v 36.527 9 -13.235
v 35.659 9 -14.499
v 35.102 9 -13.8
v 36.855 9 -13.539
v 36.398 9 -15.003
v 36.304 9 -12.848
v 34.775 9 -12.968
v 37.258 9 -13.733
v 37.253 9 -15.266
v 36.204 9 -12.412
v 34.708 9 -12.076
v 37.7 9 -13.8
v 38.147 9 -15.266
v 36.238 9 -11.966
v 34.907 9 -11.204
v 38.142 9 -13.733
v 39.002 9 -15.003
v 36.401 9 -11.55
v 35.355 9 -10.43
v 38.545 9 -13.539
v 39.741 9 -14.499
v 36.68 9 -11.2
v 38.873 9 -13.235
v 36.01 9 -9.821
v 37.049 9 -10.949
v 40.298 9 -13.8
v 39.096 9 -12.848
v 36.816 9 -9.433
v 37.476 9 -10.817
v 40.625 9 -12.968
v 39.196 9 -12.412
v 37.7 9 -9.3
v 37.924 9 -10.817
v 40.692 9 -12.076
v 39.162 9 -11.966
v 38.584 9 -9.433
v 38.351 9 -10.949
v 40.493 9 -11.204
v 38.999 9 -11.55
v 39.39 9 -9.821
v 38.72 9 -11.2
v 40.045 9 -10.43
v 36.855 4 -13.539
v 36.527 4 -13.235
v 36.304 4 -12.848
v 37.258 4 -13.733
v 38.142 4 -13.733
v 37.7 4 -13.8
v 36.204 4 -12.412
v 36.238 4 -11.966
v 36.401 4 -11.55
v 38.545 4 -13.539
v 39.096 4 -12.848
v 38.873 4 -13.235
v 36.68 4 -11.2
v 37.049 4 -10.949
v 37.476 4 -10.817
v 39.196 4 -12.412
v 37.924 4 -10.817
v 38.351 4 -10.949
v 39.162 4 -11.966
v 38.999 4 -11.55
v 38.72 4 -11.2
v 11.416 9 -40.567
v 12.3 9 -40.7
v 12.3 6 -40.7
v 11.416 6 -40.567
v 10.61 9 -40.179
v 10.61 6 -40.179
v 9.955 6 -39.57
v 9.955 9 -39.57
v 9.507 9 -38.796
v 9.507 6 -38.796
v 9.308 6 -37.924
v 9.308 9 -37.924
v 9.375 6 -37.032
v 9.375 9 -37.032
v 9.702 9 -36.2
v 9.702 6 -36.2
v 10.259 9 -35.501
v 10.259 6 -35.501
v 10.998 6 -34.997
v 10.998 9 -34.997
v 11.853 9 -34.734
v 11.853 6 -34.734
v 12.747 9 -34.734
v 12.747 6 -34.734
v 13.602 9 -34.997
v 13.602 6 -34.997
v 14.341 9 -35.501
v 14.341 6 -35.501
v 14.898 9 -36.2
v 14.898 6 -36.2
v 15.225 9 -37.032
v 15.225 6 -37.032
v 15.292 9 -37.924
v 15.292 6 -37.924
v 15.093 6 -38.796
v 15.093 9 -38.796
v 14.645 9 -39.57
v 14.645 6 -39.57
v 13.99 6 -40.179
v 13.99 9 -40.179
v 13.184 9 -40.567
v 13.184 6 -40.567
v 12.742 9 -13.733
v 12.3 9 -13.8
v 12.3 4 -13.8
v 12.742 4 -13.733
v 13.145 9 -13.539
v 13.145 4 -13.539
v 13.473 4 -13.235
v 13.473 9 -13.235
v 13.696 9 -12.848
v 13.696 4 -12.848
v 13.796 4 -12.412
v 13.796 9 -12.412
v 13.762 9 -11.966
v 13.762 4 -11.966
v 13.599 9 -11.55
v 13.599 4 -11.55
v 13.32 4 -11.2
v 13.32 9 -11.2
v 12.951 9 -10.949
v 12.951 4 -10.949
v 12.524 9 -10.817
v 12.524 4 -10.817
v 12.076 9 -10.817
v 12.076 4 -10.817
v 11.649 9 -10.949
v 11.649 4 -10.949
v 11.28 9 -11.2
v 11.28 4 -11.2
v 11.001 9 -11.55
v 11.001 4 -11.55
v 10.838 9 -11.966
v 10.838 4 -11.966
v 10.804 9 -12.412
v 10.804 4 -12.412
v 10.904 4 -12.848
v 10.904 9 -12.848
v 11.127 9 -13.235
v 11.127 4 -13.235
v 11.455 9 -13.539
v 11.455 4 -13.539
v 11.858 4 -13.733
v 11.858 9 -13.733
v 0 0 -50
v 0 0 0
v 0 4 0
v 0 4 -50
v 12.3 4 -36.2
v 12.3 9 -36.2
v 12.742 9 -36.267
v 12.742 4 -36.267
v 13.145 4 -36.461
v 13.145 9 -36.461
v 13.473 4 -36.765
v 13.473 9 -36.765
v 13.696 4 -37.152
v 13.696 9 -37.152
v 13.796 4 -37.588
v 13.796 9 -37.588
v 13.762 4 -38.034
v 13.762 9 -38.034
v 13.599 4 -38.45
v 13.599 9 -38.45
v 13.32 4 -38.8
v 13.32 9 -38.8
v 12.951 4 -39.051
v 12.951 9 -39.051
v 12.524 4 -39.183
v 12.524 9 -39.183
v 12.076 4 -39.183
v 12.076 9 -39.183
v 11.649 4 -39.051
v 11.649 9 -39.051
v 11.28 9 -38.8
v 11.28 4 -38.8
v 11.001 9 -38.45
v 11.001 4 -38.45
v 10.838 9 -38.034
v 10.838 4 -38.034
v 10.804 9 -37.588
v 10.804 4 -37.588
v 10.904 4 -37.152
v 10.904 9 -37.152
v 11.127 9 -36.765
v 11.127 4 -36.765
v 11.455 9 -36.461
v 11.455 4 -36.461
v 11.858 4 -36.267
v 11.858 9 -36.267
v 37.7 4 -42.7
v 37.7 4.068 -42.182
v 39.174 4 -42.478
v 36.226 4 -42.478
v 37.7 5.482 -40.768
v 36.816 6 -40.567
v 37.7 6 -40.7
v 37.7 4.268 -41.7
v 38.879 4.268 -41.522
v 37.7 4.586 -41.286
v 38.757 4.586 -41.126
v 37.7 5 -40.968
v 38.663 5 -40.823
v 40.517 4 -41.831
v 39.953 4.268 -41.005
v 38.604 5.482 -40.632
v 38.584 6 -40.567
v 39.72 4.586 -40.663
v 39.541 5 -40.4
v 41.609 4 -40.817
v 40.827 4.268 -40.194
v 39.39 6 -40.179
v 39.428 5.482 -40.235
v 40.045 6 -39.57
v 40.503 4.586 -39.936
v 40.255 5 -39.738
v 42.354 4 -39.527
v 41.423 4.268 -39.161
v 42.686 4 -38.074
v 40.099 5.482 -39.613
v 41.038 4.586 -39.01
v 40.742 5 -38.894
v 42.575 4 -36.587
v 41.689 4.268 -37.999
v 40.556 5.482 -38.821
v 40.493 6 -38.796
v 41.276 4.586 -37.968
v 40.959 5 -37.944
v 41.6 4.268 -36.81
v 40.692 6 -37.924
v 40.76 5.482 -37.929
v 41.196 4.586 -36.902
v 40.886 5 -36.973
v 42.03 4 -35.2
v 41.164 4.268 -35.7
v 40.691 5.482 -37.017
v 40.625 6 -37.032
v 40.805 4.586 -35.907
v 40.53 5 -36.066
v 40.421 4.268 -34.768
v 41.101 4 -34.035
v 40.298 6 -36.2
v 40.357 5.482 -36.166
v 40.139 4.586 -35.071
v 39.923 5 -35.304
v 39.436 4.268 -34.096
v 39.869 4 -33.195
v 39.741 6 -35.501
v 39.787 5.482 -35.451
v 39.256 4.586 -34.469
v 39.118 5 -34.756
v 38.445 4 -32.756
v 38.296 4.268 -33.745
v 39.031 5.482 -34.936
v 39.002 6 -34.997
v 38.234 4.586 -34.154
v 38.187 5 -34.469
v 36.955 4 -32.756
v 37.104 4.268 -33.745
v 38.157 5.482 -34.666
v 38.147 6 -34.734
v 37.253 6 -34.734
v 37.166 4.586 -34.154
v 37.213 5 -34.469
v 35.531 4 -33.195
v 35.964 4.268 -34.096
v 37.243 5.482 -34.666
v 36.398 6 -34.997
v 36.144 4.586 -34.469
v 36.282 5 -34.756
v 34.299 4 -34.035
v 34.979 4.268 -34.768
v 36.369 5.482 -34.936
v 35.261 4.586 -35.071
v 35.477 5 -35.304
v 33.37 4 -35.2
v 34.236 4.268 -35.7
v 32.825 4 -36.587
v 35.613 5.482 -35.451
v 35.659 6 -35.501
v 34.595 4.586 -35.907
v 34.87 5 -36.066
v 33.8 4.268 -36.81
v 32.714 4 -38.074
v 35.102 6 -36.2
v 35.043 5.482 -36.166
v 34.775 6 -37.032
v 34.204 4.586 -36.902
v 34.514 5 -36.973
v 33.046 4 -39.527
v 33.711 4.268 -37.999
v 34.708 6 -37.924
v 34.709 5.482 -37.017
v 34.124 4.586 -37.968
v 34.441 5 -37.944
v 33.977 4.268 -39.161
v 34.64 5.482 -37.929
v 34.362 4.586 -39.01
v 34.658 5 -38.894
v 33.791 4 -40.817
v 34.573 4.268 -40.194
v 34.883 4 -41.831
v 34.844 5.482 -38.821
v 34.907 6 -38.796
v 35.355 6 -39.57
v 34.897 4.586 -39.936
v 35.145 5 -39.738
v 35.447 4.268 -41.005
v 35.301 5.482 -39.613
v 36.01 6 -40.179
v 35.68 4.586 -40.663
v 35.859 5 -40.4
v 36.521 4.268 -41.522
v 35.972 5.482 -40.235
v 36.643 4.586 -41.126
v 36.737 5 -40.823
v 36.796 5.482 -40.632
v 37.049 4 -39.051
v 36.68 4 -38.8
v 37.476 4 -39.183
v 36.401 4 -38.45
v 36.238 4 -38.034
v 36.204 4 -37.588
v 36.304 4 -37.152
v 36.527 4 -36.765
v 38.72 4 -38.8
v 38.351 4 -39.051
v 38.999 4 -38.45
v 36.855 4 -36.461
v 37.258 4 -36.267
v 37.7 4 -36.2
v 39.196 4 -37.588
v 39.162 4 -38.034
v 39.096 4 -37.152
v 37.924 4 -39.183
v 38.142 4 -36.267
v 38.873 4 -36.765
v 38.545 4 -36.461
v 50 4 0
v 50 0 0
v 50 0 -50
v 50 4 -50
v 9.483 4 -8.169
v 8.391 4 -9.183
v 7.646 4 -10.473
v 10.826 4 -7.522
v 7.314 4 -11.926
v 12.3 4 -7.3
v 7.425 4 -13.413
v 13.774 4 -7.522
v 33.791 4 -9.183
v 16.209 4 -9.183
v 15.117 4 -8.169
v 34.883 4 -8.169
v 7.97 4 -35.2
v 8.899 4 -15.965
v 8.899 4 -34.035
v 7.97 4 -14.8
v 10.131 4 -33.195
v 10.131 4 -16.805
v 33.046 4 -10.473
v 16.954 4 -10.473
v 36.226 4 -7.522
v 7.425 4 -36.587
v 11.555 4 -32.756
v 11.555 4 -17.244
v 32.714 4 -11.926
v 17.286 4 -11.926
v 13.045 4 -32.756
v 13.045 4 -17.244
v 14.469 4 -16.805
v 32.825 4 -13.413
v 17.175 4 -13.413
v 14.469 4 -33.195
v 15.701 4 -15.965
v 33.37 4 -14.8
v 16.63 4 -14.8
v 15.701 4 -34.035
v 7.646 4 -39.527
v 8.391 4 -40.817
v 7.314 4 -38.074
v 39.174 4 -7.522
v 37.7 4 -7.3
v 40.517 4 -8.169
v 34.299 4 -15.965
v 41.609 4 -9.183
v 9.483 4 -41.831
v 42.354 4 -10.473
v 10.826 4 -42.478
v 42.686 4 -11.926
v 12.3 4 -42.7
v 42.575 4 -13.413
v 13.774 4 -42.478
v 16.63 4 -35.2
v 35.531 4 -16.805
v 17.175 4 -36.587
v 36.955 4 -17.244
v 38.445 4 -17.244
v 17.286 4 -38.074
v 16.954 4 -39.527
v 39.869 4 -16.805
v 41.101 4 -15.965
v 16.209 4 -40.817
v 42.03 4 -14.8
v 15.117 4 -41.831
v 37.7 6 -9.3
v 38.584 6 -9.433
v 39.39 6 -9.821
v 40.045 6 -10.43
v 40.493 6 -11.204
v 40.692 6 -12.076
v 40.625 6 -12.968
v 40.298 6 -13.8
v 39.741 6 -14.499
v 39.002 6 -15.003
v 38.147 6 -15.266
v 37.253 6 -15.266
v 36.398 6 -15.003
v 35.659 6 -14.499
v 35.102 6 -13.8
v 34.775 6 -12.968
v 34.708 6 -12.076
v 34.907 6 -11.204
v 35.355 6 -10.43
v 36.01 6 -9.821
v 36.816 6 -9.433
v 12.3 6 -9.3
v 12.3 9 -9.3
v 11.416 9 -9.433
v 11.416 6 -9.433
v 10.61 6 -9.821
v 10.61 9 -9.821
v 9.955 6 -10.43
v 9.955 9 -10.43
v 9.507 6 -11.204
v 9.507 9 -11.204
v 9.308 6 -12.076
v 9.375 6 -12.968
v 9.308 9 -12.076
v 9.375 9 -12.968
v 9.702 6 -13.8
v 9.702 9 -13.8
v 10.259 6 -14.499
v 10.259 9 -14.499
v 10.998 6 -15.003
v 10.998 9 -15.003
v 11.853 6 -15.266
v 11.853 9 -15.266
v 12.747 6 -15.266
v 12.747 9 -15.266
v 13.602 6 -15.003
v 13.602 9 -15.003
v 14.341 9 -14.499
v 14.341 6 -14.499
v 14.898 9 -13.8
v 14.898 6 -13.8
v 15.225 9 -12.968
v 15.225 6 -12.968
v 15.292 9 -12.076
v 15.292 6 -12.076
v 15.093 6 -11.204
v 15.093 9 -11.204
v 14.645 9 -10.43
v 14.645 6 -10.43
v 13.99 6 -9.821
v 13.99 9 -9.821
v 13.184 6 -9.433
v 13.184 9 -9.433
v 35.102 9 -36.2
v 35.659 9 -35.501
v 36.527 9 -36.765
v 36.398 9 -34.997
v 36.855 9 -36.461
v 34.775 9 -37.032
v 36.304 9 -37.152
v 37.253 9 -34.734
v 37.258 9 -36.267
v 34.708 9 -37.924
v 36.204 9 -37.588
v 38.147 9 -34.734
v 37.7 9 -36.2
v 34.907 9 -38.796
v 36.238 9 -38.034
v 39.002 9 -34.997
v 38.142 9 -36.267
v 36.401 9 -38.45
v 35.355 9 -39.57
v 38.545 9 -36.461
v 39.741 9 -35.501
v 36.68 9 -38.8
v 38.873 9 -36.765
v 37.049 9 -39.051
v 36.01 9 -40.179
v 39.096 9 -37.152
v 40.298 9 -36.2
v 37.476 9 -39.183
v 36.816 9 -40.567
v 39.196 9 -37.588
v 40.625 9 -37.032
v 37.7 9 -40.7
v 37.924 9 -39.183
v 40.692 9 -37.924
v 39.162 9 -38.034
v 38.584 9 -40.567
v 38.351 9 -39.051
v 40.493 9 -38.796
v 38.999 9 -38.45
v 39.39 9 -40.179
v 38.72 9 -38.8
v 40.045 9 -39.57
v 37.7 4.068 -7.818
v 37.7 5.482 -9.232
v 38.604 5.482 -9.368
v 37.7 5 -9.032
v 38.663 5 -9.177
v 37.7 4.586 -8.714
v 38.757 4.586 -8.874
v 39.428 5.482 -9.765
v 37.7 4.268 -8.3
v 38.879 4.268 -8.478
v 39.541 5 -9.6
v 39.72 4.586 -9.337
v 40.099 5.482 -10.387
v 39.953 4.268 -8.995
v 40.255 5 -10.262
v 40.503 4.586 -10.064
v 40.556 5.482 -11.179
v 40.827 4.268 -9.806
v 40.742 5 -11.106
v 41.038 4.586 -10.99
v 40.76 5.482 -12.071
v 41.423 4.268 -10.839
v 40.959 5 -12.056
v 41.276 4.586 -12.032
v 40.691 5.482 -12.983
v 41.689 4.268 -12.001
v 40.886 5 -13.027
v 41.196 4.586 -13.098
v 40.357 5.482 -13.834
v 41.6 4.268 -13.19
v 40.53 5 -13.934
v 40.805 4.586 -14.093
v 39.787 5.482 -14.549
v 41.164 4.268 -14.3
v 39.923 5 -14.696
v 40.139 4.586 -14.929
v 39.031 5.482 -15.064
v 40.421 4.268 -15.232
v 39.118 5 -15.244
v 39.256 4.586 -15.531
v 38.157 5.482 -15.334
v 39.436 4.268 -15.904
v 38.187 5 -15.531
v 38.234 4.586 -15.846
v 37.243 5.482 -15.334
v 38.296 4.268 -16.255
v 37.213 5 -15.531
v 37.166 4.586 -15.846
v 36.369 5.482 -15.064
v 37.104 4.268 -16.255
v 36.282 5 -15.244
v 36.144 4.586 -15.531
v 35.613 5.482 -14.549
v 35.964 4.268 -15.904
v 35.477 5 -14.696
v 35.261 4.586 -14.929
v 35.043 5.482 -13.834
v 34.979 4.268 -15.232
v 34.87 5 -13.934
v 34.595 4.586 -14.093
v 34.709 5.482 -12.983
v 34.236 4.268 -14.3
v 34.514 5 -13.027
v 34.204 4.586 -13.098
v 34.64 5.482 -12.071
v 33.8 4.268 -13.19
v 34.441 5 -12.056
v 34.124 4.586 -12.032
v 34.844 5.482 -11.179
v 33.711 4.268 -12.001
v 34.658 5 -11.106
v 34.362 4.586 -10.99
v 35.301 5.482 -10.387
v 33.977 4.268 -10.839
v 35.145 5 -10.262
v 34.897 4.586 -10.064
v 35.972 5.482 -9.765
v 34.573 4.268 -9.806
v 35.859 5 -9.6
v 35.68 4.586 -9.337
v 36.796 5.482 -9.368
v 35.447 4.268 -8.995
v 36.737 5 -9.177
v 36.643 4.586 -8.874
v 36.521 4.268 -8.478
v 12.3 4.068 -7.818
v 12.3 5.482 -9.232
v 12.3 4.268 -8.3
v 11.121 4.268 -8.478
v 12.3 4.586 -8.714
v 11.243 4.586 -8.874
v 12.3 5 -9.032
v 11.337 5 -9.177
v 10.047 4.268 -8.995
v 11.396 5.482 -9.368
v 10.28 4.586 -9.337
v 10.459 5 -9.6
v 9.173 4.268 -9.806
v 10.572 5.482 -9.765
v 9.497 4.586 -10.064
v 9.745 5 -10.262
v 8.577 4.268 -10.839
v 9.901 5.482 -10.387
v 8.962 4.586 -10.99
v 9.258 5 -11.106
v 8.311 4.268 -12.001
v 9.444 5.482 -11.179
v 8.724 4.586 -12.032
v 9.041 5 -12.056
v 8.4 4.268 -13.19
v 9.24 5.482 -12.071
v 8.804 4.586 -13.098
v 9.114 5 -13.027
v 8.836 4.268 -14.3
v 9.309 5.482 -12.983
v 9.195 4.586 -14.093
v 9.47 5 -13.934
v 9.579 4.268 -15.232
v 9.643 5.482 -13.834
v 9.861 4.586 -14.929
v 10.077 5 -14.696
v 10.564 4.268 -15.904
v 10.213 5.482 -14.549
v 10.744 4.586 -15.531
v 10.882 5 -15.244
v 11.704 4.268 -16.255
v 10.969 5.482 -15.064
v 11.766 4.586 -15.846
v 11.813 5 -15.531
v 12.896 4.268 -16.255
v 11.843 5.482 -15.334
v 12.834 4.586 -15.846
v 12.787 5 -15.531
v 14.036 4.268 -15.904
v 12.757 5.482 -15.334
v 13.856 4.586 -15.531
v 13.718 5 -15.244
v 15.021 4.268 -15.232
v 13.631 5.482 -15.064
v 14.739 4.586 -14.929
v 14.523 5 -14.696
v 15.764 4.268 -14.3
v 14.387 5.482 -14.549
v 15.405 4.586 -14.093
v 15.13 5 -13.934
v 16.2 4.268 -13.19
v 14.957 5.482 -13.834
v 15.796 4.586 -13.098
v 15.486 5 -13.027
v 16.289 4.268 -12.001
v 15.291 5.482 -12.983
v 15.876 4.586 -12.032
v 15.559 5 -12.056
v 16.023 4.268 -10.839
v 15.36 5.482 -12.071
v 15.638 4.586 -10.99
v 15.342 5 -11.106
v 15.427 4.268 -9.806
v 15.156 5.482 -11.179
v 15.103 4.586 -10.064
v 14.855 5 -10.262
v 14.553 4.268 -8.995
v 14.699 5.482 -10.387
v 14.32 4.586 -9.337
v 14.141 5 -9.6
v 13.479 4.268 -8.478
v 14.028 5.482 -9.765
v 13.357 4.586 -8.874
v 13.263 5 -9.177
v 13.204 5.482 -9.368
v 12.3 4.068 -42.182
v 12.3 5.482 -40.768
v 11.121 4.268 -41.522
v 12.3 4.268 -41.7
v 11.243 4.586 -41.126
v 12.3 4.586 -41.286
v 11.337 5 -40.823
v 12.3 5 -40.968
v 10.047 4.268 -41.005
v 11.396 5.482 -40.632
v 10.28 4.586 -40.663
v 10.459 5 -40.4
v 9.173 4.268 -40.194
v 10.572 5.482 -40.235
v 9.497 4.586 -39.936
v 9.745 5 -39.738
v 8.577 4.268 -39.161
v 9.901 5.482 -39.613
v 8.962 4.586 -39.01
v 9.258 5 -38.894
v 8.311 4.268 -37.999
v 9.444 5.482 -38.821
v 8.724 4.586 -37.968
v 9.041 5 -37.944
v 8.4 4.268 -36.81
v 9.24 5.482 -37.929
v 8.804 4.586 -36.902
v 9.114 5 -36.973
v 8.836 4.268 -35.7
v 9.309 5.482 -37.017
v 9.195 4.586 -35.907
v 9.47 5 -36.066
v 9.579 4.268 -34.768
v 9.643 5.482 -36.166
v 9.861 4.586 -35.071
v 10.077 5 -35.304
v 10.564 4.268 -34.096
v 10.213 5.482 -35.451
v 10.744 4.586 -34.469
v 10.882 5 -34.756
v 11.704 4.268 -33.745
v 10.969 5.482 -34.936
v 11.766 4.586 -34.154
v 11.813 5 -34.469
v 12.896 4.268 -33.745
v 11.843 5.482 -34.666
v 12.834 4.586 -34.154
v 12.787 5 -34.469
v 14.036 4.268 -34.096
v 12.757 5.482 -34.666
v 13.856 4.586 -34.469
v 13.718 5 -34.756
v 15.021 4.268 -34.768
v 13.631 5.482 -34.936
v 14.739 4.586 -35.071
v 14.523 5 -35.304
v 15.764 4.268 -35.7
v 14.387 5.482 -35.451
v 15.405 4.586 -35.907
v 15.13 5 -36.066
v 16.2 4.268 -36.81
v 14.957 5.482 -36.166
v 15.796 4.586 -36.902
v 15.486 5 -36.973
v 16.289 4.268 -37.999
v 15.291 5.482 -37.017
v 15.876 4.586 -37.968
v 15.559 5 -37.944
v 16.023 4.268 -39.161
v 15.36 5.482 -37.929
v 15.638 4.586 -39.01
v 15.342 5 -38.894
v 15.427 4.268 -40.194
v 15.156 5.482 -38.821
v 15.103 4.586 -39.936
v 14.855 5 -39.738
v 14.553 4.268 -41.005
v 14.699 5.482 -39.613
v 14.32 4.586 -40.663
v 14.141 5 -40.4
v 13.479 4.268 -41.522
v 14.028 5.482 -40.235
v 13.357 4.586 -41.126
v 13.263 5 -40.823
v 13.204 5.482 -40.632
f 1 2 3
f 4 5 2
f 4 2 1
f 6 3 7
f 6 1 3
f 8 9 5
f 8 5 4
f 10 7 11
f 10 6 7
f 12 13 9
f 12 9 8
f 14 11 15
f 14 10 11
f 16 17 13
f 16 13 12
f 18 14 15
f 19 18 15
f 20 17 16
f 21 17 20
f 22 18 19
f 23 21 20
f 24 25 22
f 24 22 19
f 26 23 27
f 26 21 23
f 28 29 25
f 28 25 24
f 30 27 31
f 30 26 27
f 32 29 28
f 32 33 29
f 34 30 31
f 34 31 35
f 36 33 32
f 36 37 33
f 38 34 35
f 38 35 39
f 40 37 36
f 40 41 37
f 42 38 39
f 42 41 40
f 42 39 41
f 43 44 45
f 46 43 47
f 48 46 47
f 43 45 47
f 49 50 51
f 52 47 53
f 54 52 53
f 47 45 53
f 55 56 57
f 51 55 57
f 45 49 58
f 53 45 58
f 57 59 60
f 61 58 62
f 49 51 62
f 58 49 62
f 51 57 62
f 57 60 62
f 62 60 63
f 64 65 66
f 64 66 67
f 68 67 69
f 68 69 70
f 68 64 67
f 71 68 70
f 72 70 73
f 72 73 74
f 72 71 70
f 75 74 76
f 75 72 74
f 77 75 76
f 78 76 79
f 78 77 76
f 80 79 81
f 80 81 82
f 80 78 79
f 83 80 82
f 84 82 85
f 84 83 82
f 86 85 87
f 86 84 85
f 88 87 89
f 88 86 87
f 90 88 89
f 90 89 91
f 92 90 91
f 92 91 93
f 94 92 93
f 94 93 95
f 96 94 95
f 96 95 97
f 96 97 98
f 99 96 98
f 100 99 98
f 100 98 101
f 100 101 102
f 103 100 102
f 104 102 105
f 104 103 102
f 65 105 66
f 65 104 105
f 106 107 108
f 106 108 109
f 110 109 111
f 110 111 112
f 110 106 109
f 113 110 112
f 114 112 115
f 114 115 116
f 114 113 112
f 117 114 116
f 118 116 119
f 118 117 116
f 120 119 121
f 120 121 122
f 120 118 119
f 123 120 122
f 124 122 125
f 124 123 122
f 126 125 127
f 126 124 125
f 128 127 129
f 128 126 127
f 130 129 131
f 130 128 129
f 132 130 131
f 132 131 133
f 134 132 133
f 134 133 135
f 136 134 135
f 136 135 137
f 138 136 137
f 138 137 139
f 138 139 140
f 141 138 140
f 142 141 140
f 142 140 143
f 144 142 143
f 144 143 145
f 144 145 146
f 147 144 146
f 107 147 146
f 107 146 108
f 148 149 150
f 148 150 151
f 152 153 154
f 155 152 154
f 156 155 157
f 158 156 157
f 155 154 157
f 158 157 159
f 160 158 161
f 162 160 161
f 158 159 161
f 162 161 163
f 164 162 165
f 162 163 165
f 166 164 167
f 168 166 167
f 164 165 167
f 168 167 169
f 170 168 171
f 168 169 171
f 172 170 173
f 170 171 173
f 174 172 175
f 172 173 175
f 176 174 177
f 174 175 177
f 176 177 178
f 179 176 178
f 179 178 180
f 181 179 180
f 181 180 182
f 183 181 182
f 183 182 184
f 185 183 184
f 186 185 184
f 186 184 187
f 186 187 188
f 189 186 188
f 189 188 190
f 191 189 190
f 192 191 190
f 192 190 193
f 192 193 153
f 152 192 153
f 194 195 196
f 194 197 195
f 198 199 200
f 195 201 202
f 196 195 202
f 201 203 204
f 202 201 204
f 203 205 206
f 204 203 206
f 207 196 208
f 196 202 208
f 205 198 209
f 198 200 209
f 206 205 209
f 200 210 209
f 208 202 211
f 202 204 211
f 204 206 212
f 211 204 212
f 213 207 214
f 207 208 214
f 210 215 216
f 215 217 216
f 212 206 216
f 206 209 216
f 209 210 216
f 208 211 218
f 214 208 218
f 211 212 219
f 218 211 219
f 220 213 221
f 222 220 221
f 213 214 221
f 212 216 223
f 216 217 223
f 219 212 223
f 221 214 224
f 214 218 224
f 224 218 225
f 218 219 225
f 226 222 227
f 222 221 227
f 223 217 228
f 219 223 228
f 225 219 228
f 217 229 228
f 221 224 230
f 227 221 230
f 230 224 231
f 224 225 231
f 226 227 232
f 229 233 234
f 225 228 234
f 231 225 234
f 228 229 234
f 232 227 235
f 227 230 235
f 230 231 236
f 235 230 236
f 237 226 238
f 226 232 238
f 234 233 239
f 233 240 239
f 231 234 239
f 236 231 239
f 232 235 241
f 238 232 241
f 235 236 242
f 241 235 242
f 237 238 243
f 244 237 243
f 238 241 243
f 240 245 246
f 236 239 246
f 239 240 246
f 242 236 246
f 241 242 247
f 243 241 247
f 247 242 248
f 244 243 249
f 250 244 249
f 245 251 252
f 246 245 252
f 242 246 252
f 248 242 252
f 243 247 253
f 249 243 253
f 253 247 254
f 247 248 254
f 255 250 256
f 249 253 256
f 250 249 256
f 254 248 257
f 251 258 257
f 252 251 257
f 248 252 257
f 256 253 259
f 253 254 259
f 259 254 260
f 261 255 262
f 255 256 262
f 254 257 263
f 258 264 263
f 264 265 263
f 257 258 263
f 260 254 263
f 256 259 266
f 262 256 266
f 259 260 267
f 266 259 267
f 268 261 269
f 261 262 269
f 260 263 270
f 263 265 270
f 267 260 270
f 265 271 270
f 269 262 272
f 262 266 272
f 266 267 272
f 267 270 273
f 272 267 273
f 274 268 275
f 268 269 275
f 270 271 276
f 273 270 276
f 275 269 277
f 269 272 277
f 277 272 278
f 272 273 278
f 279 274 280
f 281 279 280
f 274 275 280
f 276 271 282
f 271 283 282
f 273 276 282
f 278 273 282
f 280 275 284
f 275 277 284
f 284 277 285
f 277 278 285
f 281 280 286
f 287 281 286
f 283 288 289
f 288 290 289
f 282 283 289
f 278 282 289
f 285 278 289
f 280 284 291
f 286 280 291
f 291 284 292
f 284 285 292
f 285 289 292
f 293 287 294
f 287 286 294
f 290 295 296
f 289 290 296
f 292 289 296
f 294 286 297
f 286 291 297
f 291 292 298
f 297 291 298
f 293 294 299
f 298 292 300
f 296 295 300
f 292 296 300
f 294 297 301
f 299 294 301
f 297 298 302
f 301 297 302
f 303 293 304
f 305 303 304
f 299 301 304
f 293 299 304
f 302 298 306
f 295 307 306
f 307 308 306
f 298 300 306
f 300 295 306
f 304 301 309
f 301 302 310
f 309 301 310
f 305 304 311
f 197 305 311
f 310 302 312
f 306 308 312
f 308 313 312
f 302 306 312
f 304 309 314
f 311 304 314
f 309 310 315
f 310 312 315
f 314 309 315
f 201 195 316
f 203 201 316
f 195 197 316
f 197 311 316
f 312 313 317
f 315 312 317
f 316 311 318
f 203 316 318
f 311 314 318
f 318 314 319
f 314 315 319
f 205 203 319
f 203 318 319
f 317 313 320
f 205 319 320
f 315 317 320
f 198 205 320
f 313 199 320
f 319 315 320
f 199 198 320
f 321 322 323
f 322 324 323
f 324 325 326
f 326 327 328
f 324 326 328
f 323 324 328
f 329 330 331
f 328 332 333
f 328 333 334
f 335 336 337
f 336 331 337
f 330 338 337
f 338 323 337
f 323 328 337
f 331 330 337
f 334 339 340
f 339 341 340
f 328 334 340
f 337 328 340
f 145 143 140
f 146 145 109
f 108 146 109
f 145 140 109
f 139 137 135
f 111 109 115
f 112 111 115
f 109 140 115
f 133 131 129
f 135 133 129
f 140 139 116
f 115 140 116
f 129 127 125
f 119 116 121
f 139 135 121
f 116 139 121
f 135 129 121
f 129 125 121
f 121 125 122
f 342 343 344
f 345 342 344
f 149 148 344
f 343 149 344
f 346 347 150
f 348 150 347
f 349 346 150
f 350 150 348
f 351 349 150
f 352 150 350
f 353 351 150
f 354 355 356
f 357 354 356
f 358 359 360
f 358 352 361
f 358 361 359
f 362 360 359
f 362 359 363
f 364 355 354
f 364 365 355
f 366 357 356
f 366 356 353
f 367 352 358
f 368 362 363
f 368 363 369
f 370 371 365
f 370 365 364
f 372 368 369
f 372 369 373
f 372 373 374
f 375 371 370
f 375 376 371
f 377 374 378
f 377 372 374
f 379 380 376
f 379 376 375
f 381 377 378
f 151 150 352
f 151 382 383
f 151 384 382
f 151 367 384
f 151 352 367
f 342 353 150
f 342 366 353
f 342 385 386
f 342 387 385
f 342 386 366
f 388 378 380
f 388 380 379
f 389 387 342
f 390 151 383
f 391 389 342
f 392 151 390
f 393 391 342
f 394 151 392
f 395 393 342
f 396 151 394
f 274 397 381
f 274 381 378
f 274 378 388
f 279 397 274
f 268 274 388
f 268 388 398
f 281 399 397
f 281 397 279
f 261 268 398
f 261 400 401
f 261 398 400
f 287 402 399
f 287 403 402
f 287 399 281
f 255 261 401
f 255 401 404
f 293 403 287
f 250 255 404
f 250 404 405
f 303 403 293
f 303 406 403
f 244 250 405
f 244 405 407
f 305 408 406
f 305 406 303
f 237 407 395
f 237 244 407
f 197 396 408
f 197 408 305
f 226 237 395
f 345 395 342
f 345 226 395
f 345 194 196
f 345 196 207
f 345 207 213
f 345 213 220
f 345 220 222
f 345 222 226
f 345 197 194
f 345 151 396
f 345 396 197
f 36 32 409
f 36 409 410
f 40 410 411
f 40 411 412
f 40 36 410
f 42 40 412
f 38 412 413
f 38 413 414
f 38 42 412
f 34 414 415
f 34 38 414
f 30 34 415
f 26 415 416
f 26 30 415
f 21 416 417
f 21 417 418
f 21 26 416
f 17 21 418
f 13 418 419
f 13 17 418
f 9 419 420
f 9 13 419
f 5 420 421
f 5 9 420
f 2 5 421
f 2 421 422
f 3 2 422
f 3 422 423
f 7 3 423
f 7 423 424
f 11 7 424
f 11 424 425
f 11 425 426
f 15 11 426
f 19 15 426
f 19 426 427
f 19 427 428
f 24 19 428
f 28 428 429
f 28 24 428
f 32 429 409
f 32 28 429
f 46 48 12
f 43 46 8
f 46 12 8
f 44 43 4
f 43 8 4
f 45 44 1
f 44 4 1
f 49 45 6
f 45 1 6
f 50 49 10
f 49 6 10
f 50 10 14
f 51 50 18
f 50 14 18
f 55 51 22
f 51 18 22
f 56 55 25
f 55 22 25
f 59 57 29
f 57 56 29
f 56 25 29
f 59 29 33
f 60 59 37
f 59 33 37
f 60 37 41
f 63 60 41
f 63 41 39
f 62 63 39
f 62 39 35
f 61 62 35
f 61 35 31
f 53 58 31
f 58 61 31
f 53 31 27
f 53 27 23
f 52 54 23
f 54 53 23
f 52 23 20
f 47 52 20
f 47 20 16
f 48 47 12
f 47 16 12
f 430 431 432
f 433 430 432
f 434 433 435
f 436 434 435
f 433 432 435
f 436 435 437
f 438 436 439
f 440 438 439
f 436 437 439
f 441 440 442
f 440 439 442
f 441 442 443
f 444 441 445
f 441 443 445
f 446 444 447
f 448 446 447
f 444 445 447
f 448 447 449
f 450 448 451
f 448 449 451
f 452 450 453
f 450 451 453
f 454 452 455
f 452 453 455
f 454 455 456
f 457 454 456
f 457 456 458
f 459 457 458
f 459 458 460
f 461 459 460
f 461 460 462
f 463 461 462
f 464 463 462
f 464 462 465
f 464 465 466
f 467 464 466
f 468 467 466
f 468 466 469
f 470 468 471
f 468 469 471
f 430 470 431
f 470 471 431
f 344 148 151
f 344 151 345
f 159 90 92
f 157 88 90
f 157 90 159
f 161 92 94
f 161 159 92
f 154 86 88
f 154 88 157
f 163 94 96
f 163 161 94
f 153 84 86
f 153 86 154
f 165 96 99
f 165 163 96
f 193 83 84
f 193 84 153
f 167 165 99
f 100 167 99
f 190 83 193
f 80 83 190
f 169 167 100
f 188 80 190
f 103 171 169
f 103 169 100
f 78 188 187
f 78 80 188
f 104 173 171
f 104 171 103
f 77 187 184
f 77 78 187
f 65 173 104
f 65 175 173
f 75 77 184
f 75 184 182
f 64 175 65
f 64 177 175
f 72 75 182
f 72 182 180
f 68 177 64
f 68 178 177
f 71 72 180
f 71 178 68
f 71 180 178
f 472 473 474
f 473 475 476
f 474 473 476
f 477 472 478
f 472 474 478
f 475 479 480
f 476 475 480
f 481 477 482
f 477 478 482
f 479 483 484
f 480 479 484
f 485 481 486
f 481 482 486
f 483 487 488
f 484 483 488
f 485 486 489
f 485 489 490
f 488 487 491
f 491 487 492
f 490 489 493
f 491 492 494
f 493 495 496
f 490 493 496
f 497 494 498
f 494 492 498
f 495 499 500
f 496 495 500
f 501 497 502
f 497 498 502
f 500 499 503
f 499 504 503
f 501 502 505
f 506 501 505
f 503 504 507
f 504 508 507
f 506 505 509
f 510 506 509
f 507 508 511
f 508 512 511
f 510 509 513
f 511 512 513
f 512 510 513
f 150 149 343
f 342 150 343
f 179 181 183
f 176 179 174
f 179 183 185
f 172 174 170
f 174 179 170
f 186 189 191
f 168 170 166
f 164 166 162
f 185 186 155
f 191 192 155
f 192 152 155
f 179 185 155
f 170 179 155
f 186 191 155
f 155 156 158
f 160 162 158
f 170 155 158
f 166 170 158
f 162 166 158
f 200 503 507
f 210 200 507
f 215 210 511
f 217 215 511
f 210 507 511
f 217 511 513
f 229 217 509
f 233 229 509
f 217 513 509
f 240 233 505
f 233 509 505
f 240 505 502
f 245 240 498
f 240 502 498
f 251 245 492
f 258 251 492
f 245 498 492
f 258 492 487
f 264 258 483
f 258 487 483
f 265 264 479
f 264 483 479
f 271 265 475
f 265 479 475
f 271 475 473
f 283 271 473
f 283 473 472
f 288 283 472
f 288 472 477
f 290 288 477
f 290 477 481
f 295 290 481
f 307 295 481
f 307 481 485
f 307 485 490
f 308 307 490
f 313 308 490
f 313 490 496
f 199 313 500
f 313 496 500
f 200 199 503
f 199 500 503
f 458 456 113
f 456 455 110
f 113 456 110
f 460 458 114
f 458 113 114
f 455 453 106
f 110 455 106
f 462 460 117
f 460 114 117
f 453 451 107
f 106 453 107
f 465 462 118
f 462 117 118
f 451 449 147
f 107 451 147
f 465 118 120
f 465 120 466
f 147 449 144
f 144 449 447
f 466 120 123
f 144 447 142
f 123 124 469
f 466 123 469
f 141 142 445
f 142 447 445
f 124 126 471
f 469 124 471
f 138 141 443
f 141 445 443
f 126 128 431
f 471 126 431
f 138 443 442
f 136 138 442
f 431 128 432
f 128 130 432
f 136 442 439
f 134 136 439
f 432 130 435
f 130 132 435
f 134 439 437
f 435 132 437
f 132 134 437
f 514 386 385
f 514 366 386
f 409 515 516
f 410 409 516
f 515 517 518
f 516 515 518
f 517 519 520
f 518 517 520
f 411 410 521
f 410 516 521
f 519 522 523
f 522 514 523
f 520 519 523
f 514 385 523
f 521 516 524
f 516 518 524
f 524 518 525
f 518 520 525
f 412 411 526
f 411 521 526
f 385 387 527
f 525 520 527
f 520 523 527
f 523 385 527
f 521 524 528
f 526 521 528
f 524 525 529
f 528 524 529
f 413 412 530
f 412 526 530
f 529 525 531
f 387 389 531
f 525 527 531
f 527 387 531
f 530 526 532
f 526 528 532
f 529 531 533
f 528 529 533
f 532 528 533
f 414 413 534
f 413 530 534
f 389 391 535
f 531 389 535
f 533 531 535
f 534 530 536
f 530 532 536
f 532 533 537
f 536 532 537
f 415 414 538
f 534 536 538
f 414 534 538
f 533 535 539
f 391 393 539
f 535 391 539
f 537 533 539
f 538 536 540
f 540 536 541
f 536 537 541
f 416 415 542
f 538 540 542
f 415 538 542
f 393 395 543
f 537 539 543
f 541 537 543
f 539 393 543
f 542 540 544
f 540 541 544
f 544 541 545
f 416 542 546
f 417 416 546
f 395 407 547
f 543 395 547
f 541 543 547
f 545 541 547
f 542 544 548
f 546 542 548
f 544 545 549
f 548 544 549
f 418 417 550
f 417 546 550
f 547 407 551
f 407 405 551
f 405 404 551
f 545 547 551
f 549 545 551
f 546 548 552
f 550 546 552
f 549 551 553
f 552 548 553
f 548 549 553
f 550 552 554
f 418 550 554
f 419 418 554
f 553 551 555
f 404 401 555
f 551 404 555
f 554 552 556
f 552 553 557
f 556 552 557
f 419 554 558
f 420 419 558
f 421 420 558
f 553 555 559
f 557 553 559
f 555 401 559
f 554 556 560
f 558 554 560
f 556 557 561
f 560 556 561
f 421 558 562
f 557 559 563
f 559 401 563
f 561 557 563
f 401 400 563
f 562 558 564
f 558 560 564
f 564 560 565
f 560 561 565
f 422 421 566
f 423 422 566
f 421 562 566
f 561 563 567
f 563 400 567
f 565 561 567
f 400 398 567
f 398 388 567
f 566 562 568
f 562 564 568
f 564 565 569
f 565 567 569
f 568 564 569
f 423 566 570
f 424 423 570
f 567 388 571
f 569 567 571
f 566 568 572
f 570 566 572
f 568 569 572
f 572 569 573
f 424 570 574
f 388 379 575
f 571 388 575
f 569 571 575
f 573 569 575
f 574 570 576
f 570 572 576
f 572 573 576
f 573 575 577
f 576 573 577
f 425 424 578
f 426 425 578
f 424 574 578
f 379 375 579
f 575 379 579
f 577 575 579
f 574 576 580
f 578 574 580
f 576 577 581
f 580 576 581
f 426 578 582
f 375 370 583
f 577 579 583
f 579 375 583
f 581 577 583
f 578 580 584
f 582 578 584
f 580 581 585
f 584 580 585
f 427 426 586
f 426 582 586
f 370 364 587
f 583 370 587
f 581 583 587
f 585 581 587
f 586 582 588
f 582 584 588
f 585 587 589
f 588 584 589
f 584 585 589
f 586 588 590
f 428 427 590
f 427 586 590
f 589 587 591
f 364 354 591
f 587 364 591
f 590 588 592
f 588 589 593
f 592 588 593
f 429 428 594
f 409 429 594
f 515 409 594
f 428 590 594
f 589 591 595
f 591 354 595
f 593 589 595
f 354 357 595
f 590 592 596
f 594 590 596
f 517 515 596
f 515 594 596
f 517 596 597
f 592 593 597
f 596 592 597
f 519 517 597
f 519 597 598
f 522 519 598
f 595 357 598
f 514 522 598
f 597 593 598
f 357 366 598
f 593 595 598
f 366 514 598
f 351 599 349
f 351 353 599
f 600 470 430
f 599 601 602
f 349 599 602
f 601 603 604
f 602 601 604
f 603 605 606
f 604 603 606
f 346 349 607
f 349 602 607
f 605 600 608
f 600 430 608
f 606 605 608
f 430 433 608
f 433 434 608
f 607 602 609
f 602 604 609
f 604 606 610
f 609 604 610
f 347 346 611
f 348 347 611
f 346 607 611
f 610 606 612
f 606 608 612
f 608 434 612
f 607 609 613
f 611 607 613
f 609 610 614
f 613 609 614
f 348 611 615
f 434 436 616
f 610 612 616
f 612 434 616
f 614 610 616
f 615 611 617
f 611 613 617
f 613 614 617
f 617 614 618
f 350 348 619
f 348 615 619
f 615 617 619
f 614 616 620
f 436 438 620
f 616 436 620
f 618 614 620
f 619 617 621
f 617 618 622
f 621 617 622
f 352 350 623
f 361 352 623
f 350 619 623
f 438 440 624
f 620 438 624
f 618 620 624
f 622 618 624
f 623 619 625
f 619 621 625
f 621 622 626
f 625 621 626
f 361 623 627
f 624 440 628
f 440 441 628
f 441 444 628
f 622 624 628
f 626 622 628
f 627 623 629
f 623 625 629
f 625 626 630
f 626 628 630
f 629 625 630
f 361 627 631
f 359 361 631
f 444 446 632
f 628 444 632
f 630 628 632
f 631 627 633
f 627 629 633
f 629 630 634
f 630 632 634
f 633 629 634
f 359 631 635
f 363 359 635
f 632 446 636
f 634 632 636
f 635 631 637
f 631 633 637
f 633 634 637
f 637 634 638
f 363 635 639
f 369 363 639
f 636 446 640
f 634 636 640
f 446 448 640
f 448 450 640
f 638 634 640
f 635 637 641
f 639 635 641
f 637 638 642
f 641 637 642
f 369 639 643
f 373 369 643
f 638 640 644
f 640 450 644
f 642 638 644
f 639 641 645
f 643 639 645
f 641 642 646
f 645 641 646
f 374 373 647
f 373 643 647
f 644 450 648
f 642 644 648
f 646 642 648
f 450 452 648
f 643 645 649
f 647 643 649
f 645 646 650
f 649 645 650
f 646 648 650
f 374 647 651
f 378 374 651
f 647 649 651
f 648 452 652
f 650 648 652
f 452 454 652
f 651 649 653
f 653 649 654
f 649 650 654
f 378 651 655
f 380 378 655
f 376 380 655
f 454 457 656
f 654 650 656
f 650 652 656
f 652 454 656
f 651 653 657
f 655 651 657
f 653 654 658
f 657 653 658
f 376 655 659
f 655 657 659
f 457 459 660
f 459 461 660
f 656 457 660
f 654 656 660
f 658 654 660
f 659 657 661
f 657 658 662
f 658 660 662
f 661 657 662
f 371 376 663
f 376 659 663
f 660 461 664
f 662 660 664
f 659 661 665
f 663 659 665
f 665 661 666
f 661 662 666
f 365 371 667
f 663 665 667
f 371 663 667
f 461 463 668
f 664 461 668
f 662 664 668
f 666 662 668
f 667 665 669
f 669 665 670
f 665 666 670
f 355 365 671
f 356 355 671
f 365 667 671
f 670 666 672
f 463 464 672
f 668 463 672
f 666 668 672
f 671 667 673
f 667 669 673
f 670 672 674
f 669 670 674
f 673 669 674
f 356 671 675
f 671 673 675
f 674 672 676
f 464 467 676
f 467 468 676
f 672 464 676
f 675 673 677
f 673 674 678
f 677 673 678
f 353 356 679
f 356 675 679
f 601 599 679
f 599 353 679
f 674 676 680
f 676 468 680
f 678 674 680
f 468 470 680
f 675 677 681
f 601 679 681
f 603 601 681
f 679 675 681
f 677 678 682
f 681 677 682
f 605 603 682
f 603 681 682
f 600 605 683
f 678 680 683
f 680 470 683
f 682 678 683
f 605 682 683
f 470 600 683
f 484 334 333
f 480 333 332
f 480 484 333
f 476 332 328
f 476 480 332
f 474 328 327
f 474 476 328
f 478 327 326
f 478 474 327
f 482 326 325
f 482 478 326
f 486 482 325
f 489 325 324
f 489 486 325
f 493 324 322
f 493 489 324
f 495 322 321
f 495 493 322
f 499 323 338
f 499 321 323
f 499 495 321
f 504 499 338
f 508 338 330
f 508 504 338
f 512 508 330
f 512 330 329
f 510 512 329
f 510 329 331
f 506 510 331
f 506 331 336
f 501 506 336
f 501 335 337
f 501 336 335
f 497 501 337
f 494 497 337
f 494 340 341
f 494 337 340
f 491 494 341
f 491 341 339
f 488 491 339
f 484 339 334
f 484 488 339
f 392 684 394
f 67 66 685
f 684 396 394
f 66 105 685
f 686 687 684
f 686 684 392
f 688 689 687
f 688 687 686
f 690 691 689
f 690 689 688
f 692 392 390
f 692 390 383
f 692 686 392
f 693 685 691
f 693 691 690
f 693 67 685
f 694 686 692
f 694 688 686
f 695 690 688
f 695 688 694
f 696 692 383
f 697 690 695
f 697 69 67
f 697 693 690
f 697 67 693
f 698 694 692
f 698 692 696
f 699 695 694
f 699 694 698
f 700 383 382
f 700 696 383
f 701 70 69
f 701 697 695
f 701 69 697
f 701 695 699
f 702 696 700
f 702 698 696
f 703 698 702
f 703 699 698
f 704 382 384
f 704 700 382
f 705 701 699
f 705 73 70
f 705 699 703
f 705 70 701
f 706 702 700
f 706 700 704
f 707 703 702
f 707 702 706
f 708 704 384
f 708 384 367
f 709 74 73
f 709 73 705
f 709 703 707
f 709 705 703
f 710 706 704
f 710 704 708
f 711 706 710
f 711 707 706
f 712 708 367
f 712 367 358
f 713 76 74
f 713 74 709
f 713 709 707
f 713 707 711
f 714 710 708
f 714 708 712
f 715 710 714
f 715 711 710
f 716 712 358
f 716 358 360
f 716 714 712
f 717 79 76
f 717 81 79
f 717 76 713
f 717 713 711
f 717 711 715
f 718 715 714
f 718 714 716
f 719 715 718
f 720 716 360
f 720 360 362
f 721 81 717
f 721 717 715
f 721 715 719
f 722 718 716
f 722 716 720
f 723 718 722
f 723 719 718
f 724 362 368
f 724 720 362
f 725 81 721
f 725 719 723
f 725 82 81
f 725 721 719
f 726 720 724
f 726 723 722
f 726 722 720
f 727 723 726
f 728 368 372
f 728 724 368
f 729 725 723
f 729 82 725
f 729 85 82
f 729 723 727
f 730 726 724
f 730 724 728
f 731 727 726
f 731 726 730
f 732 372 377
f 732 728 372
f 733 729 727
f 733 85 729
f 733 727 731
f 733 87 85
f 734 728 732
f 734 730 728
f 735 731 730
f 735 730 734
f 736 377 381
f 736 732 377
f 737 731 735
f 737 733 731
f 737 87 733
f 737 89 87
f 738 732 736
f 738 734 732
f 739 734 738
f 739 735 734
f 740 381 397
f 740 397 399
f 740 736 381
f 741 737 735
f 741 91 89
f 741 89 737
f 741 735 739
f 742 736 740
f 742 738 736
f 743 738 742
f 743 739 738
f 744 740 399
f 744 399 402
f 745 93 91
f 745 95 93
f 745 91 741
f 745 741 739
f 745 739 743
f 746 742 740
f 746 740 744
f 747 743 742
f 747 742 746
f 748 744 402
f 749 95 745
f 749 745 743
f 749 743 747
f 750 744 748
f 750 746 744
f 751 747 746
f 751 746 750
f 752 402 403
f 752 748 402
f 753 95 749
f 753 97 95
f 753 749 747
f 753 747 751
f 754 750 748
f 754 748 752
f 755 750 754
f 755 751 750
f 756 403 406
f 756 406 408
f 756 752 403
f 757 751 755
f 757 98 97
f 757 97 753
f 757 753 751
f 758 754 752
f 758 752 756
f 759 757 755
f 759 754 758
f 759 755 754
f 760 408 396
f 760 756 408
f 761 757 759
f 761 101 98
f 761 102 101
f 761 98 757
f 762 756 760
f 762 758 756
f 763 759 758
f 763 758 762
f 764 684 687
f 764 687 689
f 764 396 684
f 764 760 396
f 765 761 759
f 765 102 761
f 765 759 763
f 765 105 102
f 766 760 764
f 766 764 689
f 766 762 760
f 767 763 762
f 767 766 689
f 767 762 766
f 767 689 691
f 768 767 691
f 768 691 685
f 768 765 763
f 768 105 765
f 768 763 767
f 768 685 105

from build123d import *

# Parameters (mm, degrees)
SKETCH2_W                 = 50
SKETCH2_H                 = 50
BOSS_EXTRUDE1_DEPTH       = 4
SKETCH3_R                 = 1.5
CUT_EXTRUDE1_DEPTH        = 4
BOSS_EXTRUDE2_START       = 5
SKETCH4_R                 = 3
SKETCH4_R_2               = 1.5
BOSS_EXTRUDE2_DEPTH       = 5
MIRROR2_START             = 5
MIRROR2_COPY_1_SKETCH_R   = 3
MIRROR2_COPY_1_SKETCH_R_2 = 1.5
MIRROR2_COPY_1_DEPTH      = 5
FILLET1_R                 = 2
SKETCH6_W                 = 50
SKETCH6_H                 = 50
BOSS_EXTRUDE3_DEPTH       = 4


with BuildPart() as part:
    # Sketch2 → Boss-Extrude1 (new body)
    with BuildSketch(Plane(origin=(0, 0, 0), x_dir=(1, 0, 0), z_dir=(0, 1, 0))):
        with Locations((25, 25)):
            Rectangle(SKETCH2_W, SKETCH2_H)
    extrude(amount=BOSS_EXTRUDE1_DEPTH)

    # Sketch3 → Cut-Extrude1 (cut)
    with BuildSketch(Plane(origin=(0, 4, 0), x_dir=(1, 0, 0), z_dir=(0, 1, 0))):
        with Locations(Location((12.3, 37.7, 0), (0, 0, 270))):
            Circle(SKETCH3_R)
        with Locations(Location((12.3, 12.3, 0), (0, 0, 270))):
            Circle(SKETCH3_R)
        with Locations(Location((37.7, 37.7, 0), (0, 0, 270))):
            Circle(SKETCH3_R)
        with Locations(Location((37.7, 12.3, 0), (0, 0, 270))):
            Circle(SKETCH3_R)
    extrude(amount=-CUT_EXTRUDE1_DEPTH, mode=Mode.SUBTRACT)

    # Sketch4 → Boss-Extrude2 (add)
    with BuildSketch(Plane(origin=(0, 4, 0), x_dir=(1, 0, 0), z_dir=(0, 1, 0)).offset(BOSS_EXTRUDE2_START)):
        with Locations(Location((12.3, 37.7, 0), (0, 0, 90))):
            Circle(SKETCH4_R)
        with Locations(Location((12.3, 37.7, 0), (0, 0, 270))):
            Circle(SKETCH4_R_2, mode=Mode.SUBTRACT)
    boss_extrude2 = extrude(amount=-BOSS_EXTRUDE2_DEPTH)

    # Mirror1: Boss-Extrude2 across plane
    add(boss_extrude2.mirror(Plane.XY.offset(-25)))

    # Mirror2: Boss-Extrude2 across plane
    add(boss_extrude2.mirror(Plane.ZY.offset(-25)))

    # Mirror2 copy 1 sketch → Mirror2 copy 1 (add)
    with BuildSketch(Plane(origin=(50, 4, -50), x_dir=(-1, 0, 0), z_dir=(0, 1, 0)).offset(MIRROR2_START)):
        with Locations(Location((12.3, 37.7, 0), (0, 0, 90))):
            Circle(MIRROR2_COPY_1_SKETCH_R)
        with Locations(Location((12.3, 37.7, 0), (0, 0, 270))):
            Circle(MIRROR2_COPY_1_SKETCH_R_2, mode=Mode.SUBTRACT)
    extrude(amount=-MIRROR2_COPY_1_DEPTH)

    # Fillet1
    fillet1_edges = [part.edges().sort_by_distance(p)[0] for p in [
        (12.3, 4, -34.7),
        (12.3, 4, -15.3),
        (37.7, 4, -15.3),
        (37.7, 4, -34.7),
    ]]
    fillet(fillet1_edges, radius=FILLET1_R)

    # Sketch6 → Boss-Extrude3 (add)
    with BuildSketch(Plane.XZ):
        with Locations((25, -25)):
            Rectangle(SKETCH6_W, SKETCH6_H)
    extrude(amount=-BOSS_EXTRUDE3_DEPTH)


solid = part.part
